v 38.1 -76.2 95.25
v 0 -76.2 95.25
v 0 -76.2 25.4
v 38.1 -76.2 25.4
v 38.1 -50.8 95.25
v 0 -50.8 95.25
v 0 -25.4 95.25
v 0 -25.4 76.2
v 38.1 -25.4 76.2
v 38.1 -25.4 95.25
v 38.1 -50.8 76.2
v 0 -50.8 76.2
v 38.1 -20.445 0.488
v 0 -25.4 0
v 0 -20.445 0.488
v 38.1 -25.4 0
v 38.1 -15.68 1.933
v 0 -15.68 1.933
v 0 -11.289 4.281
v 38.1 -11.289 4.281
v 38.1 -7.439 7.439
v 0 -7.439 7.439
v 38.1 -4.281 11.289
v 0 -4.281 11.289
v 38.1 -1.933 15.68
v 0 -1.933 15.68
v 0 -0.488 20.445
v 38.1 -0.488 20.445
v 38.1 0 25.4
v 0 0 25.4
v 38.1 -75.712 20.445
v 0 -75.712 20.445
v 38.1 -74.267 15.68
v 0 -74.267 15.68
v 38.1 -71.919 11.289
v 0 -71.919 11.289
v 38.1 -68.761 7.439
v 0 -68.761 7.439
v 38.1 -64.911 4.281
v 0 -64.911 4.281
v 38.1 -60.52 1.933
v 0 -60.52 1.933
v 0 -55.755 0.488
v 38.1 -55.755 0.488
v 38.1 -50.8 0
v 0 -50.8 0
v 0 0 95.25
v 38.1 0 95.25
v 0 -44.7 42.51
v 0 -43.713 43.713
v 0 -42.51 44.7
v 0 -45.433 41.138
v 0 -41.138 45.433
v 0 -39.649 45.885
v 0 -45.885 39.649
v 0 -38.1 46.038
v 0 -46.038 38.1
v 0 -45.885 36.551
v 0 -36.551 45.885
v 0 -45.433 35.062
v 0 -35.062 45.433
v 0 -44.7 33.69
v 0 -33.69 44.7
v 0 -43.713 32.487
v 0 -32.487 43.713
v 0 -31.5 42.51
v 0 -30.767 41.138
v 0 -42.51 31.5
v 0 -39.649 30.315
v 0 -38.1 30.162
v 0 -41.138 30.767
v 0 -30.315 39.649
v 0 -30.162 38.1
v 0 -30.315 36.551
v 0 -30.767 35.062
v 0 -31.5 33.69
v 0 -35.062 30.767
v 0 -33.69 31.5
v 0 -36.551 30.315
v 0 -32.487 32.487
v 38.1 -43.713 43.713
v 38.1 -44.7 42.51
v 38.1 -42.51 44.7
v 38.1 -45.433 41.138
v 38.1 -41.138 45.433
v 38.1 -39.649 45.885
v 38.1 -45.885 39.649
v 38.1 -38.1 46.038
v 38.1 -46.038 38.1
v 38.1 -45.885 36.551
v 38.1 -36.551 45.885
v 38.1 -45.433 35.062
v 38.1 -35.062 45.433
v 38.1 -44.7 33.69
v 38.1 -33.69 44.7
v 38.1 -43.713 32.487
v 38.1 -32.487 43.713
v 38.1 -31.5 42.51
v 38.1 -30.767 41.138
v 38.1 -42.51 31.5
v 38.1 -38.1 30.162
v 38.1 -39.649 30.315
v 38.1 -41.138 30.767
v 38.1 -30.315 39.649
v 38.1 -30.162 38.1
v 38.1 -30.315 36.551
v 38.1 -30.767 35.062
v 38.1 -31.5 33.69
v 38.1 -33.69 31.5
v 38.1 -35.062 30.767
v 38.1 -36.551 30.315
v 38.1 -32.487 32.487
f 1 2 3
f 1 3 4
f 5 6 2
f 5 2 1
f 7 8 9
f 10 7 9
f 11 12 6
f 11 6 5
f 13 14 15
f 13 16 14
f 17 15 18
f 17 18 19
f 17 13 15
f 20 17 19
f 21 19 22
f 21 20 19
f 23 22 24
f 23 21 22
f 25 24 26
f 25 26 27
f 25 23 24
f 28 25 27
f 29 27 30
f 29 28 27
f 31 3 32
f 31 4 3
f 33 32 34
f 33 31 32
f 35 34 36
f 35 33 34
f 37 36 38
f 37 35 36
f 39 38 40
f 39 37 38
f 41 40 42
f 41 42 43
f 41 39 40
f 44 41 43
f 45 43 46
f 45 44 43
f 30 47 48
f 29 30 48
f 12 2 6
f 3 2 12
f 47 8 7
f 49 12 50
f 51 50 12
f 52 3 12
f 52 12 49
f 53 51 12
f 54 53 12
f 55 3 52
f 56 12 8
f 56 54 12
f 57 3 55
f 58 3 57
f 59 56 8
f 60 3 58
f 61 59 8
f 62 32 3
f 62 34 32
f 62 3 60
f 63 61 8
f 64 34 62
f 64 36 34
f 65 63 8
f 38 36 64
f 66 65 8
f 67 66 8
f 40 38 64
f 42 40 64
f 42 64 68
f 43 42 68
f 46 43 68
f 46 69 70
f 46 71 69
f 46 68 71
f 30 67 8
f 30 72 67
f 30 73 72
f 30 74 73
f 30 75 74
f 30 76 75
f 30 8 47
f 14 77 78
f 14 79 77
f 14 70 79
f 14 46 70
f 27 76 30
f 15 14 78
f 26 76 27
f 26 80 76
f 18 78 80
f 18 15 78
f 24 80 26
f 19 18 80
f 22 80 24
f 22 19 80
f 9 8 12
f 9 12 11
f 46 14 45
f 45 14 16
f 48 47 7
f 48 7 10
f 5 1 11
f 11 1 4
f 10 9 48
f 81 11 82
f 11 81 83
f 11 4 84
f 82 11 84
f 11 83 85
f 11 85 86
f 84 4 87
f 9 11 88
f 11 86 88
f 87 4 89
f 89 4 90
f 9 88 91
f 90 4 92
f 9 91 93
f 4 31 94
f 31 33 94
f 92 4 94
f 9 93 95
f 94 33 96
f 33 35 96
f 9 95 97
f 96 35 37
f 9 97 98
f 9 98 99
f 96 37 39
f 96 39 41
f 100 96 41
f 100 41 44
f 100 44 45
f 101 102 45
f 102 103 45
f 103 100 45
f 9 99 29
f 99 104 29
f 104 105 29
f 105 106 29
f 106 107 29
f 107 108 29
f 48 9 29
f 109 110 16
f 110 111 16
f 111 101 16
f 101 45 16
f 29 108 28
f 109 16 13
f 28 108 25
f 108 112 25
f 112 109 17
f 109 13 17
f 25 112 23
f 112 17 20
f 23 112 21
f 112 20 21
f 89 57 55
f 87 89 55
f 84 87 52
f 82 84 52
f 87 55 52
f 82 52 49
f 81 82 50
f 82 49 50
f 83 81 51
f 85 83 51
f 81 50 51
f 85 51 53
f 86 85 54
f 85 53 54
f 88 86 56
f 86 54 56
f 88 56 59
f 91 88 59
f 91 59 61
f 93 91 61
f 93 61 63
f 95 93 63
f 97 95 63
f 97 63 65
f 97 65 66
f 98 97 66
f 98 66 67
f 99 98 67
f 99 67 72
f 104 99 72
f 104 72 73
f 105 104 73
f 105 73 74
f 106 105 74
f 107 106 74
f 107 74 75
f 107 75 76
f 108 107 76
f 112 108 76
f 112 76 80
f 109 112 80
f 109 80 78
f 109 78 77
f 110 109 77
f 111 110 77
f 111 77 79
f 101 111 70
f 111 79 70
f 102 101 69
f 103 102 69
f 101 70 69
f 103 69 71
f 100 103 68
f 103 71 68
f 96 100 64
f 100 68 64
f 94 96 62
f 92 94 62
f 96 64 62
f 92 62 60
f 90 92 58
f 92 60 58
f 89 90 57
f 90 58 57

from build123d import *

# Parameters (mm, degrees)
F0_W     = 38.1
F0_H     = 76.2
F1_DEPTH = 76.2
F2_R     = 7.9375
F3_DEPTH = 59.944
F4_W     = 38.1
F4_H     = 25.4
F5_DEPTH = 19.05
F6_R     = 25.4


with BuildPart() as f1:
    # F0 (on Top) → F1 (new body)
    with BuildSketch(Plane.XY):
        with Locations((19.05, -38.1)):
            Rectangle(F0_W, F0_H)
    extrude(amount=F1_DEPTH)

    # F2 (on face) → F3 (cut)
    with BuildSketch(Plane(origin=(0, 0, 0), x_dir=(0, -1, 0), z_dir=(-1, 0, 0))):
        with Locations((38.1, 38.1)):
            Circle(F2_R)
    extrude(amount=-F3_DEPTH, mode=Mode.SUBTRACT)

    # F4 (on face) → F5 (join)
    with BuildSketch(Plane.XY.offset(76.2)):
        with Locations((19.05, -12.7)):
            Rectangle(F4_W, F4_H)
        with Locations((19.05, -63.5)):
            Rectangle(F4_W, F4_H)
    extrude(amount=F5_DEPTH)

    # F6
    f6_edges = [f1.edges().sort_by_distance(p)[0] for p in [
        (19.05, 0, 0),
        (19.05, -76.2, 0),
    ]]
    fillet(f6_edges, radius=F6_R)


solid = f1.part
